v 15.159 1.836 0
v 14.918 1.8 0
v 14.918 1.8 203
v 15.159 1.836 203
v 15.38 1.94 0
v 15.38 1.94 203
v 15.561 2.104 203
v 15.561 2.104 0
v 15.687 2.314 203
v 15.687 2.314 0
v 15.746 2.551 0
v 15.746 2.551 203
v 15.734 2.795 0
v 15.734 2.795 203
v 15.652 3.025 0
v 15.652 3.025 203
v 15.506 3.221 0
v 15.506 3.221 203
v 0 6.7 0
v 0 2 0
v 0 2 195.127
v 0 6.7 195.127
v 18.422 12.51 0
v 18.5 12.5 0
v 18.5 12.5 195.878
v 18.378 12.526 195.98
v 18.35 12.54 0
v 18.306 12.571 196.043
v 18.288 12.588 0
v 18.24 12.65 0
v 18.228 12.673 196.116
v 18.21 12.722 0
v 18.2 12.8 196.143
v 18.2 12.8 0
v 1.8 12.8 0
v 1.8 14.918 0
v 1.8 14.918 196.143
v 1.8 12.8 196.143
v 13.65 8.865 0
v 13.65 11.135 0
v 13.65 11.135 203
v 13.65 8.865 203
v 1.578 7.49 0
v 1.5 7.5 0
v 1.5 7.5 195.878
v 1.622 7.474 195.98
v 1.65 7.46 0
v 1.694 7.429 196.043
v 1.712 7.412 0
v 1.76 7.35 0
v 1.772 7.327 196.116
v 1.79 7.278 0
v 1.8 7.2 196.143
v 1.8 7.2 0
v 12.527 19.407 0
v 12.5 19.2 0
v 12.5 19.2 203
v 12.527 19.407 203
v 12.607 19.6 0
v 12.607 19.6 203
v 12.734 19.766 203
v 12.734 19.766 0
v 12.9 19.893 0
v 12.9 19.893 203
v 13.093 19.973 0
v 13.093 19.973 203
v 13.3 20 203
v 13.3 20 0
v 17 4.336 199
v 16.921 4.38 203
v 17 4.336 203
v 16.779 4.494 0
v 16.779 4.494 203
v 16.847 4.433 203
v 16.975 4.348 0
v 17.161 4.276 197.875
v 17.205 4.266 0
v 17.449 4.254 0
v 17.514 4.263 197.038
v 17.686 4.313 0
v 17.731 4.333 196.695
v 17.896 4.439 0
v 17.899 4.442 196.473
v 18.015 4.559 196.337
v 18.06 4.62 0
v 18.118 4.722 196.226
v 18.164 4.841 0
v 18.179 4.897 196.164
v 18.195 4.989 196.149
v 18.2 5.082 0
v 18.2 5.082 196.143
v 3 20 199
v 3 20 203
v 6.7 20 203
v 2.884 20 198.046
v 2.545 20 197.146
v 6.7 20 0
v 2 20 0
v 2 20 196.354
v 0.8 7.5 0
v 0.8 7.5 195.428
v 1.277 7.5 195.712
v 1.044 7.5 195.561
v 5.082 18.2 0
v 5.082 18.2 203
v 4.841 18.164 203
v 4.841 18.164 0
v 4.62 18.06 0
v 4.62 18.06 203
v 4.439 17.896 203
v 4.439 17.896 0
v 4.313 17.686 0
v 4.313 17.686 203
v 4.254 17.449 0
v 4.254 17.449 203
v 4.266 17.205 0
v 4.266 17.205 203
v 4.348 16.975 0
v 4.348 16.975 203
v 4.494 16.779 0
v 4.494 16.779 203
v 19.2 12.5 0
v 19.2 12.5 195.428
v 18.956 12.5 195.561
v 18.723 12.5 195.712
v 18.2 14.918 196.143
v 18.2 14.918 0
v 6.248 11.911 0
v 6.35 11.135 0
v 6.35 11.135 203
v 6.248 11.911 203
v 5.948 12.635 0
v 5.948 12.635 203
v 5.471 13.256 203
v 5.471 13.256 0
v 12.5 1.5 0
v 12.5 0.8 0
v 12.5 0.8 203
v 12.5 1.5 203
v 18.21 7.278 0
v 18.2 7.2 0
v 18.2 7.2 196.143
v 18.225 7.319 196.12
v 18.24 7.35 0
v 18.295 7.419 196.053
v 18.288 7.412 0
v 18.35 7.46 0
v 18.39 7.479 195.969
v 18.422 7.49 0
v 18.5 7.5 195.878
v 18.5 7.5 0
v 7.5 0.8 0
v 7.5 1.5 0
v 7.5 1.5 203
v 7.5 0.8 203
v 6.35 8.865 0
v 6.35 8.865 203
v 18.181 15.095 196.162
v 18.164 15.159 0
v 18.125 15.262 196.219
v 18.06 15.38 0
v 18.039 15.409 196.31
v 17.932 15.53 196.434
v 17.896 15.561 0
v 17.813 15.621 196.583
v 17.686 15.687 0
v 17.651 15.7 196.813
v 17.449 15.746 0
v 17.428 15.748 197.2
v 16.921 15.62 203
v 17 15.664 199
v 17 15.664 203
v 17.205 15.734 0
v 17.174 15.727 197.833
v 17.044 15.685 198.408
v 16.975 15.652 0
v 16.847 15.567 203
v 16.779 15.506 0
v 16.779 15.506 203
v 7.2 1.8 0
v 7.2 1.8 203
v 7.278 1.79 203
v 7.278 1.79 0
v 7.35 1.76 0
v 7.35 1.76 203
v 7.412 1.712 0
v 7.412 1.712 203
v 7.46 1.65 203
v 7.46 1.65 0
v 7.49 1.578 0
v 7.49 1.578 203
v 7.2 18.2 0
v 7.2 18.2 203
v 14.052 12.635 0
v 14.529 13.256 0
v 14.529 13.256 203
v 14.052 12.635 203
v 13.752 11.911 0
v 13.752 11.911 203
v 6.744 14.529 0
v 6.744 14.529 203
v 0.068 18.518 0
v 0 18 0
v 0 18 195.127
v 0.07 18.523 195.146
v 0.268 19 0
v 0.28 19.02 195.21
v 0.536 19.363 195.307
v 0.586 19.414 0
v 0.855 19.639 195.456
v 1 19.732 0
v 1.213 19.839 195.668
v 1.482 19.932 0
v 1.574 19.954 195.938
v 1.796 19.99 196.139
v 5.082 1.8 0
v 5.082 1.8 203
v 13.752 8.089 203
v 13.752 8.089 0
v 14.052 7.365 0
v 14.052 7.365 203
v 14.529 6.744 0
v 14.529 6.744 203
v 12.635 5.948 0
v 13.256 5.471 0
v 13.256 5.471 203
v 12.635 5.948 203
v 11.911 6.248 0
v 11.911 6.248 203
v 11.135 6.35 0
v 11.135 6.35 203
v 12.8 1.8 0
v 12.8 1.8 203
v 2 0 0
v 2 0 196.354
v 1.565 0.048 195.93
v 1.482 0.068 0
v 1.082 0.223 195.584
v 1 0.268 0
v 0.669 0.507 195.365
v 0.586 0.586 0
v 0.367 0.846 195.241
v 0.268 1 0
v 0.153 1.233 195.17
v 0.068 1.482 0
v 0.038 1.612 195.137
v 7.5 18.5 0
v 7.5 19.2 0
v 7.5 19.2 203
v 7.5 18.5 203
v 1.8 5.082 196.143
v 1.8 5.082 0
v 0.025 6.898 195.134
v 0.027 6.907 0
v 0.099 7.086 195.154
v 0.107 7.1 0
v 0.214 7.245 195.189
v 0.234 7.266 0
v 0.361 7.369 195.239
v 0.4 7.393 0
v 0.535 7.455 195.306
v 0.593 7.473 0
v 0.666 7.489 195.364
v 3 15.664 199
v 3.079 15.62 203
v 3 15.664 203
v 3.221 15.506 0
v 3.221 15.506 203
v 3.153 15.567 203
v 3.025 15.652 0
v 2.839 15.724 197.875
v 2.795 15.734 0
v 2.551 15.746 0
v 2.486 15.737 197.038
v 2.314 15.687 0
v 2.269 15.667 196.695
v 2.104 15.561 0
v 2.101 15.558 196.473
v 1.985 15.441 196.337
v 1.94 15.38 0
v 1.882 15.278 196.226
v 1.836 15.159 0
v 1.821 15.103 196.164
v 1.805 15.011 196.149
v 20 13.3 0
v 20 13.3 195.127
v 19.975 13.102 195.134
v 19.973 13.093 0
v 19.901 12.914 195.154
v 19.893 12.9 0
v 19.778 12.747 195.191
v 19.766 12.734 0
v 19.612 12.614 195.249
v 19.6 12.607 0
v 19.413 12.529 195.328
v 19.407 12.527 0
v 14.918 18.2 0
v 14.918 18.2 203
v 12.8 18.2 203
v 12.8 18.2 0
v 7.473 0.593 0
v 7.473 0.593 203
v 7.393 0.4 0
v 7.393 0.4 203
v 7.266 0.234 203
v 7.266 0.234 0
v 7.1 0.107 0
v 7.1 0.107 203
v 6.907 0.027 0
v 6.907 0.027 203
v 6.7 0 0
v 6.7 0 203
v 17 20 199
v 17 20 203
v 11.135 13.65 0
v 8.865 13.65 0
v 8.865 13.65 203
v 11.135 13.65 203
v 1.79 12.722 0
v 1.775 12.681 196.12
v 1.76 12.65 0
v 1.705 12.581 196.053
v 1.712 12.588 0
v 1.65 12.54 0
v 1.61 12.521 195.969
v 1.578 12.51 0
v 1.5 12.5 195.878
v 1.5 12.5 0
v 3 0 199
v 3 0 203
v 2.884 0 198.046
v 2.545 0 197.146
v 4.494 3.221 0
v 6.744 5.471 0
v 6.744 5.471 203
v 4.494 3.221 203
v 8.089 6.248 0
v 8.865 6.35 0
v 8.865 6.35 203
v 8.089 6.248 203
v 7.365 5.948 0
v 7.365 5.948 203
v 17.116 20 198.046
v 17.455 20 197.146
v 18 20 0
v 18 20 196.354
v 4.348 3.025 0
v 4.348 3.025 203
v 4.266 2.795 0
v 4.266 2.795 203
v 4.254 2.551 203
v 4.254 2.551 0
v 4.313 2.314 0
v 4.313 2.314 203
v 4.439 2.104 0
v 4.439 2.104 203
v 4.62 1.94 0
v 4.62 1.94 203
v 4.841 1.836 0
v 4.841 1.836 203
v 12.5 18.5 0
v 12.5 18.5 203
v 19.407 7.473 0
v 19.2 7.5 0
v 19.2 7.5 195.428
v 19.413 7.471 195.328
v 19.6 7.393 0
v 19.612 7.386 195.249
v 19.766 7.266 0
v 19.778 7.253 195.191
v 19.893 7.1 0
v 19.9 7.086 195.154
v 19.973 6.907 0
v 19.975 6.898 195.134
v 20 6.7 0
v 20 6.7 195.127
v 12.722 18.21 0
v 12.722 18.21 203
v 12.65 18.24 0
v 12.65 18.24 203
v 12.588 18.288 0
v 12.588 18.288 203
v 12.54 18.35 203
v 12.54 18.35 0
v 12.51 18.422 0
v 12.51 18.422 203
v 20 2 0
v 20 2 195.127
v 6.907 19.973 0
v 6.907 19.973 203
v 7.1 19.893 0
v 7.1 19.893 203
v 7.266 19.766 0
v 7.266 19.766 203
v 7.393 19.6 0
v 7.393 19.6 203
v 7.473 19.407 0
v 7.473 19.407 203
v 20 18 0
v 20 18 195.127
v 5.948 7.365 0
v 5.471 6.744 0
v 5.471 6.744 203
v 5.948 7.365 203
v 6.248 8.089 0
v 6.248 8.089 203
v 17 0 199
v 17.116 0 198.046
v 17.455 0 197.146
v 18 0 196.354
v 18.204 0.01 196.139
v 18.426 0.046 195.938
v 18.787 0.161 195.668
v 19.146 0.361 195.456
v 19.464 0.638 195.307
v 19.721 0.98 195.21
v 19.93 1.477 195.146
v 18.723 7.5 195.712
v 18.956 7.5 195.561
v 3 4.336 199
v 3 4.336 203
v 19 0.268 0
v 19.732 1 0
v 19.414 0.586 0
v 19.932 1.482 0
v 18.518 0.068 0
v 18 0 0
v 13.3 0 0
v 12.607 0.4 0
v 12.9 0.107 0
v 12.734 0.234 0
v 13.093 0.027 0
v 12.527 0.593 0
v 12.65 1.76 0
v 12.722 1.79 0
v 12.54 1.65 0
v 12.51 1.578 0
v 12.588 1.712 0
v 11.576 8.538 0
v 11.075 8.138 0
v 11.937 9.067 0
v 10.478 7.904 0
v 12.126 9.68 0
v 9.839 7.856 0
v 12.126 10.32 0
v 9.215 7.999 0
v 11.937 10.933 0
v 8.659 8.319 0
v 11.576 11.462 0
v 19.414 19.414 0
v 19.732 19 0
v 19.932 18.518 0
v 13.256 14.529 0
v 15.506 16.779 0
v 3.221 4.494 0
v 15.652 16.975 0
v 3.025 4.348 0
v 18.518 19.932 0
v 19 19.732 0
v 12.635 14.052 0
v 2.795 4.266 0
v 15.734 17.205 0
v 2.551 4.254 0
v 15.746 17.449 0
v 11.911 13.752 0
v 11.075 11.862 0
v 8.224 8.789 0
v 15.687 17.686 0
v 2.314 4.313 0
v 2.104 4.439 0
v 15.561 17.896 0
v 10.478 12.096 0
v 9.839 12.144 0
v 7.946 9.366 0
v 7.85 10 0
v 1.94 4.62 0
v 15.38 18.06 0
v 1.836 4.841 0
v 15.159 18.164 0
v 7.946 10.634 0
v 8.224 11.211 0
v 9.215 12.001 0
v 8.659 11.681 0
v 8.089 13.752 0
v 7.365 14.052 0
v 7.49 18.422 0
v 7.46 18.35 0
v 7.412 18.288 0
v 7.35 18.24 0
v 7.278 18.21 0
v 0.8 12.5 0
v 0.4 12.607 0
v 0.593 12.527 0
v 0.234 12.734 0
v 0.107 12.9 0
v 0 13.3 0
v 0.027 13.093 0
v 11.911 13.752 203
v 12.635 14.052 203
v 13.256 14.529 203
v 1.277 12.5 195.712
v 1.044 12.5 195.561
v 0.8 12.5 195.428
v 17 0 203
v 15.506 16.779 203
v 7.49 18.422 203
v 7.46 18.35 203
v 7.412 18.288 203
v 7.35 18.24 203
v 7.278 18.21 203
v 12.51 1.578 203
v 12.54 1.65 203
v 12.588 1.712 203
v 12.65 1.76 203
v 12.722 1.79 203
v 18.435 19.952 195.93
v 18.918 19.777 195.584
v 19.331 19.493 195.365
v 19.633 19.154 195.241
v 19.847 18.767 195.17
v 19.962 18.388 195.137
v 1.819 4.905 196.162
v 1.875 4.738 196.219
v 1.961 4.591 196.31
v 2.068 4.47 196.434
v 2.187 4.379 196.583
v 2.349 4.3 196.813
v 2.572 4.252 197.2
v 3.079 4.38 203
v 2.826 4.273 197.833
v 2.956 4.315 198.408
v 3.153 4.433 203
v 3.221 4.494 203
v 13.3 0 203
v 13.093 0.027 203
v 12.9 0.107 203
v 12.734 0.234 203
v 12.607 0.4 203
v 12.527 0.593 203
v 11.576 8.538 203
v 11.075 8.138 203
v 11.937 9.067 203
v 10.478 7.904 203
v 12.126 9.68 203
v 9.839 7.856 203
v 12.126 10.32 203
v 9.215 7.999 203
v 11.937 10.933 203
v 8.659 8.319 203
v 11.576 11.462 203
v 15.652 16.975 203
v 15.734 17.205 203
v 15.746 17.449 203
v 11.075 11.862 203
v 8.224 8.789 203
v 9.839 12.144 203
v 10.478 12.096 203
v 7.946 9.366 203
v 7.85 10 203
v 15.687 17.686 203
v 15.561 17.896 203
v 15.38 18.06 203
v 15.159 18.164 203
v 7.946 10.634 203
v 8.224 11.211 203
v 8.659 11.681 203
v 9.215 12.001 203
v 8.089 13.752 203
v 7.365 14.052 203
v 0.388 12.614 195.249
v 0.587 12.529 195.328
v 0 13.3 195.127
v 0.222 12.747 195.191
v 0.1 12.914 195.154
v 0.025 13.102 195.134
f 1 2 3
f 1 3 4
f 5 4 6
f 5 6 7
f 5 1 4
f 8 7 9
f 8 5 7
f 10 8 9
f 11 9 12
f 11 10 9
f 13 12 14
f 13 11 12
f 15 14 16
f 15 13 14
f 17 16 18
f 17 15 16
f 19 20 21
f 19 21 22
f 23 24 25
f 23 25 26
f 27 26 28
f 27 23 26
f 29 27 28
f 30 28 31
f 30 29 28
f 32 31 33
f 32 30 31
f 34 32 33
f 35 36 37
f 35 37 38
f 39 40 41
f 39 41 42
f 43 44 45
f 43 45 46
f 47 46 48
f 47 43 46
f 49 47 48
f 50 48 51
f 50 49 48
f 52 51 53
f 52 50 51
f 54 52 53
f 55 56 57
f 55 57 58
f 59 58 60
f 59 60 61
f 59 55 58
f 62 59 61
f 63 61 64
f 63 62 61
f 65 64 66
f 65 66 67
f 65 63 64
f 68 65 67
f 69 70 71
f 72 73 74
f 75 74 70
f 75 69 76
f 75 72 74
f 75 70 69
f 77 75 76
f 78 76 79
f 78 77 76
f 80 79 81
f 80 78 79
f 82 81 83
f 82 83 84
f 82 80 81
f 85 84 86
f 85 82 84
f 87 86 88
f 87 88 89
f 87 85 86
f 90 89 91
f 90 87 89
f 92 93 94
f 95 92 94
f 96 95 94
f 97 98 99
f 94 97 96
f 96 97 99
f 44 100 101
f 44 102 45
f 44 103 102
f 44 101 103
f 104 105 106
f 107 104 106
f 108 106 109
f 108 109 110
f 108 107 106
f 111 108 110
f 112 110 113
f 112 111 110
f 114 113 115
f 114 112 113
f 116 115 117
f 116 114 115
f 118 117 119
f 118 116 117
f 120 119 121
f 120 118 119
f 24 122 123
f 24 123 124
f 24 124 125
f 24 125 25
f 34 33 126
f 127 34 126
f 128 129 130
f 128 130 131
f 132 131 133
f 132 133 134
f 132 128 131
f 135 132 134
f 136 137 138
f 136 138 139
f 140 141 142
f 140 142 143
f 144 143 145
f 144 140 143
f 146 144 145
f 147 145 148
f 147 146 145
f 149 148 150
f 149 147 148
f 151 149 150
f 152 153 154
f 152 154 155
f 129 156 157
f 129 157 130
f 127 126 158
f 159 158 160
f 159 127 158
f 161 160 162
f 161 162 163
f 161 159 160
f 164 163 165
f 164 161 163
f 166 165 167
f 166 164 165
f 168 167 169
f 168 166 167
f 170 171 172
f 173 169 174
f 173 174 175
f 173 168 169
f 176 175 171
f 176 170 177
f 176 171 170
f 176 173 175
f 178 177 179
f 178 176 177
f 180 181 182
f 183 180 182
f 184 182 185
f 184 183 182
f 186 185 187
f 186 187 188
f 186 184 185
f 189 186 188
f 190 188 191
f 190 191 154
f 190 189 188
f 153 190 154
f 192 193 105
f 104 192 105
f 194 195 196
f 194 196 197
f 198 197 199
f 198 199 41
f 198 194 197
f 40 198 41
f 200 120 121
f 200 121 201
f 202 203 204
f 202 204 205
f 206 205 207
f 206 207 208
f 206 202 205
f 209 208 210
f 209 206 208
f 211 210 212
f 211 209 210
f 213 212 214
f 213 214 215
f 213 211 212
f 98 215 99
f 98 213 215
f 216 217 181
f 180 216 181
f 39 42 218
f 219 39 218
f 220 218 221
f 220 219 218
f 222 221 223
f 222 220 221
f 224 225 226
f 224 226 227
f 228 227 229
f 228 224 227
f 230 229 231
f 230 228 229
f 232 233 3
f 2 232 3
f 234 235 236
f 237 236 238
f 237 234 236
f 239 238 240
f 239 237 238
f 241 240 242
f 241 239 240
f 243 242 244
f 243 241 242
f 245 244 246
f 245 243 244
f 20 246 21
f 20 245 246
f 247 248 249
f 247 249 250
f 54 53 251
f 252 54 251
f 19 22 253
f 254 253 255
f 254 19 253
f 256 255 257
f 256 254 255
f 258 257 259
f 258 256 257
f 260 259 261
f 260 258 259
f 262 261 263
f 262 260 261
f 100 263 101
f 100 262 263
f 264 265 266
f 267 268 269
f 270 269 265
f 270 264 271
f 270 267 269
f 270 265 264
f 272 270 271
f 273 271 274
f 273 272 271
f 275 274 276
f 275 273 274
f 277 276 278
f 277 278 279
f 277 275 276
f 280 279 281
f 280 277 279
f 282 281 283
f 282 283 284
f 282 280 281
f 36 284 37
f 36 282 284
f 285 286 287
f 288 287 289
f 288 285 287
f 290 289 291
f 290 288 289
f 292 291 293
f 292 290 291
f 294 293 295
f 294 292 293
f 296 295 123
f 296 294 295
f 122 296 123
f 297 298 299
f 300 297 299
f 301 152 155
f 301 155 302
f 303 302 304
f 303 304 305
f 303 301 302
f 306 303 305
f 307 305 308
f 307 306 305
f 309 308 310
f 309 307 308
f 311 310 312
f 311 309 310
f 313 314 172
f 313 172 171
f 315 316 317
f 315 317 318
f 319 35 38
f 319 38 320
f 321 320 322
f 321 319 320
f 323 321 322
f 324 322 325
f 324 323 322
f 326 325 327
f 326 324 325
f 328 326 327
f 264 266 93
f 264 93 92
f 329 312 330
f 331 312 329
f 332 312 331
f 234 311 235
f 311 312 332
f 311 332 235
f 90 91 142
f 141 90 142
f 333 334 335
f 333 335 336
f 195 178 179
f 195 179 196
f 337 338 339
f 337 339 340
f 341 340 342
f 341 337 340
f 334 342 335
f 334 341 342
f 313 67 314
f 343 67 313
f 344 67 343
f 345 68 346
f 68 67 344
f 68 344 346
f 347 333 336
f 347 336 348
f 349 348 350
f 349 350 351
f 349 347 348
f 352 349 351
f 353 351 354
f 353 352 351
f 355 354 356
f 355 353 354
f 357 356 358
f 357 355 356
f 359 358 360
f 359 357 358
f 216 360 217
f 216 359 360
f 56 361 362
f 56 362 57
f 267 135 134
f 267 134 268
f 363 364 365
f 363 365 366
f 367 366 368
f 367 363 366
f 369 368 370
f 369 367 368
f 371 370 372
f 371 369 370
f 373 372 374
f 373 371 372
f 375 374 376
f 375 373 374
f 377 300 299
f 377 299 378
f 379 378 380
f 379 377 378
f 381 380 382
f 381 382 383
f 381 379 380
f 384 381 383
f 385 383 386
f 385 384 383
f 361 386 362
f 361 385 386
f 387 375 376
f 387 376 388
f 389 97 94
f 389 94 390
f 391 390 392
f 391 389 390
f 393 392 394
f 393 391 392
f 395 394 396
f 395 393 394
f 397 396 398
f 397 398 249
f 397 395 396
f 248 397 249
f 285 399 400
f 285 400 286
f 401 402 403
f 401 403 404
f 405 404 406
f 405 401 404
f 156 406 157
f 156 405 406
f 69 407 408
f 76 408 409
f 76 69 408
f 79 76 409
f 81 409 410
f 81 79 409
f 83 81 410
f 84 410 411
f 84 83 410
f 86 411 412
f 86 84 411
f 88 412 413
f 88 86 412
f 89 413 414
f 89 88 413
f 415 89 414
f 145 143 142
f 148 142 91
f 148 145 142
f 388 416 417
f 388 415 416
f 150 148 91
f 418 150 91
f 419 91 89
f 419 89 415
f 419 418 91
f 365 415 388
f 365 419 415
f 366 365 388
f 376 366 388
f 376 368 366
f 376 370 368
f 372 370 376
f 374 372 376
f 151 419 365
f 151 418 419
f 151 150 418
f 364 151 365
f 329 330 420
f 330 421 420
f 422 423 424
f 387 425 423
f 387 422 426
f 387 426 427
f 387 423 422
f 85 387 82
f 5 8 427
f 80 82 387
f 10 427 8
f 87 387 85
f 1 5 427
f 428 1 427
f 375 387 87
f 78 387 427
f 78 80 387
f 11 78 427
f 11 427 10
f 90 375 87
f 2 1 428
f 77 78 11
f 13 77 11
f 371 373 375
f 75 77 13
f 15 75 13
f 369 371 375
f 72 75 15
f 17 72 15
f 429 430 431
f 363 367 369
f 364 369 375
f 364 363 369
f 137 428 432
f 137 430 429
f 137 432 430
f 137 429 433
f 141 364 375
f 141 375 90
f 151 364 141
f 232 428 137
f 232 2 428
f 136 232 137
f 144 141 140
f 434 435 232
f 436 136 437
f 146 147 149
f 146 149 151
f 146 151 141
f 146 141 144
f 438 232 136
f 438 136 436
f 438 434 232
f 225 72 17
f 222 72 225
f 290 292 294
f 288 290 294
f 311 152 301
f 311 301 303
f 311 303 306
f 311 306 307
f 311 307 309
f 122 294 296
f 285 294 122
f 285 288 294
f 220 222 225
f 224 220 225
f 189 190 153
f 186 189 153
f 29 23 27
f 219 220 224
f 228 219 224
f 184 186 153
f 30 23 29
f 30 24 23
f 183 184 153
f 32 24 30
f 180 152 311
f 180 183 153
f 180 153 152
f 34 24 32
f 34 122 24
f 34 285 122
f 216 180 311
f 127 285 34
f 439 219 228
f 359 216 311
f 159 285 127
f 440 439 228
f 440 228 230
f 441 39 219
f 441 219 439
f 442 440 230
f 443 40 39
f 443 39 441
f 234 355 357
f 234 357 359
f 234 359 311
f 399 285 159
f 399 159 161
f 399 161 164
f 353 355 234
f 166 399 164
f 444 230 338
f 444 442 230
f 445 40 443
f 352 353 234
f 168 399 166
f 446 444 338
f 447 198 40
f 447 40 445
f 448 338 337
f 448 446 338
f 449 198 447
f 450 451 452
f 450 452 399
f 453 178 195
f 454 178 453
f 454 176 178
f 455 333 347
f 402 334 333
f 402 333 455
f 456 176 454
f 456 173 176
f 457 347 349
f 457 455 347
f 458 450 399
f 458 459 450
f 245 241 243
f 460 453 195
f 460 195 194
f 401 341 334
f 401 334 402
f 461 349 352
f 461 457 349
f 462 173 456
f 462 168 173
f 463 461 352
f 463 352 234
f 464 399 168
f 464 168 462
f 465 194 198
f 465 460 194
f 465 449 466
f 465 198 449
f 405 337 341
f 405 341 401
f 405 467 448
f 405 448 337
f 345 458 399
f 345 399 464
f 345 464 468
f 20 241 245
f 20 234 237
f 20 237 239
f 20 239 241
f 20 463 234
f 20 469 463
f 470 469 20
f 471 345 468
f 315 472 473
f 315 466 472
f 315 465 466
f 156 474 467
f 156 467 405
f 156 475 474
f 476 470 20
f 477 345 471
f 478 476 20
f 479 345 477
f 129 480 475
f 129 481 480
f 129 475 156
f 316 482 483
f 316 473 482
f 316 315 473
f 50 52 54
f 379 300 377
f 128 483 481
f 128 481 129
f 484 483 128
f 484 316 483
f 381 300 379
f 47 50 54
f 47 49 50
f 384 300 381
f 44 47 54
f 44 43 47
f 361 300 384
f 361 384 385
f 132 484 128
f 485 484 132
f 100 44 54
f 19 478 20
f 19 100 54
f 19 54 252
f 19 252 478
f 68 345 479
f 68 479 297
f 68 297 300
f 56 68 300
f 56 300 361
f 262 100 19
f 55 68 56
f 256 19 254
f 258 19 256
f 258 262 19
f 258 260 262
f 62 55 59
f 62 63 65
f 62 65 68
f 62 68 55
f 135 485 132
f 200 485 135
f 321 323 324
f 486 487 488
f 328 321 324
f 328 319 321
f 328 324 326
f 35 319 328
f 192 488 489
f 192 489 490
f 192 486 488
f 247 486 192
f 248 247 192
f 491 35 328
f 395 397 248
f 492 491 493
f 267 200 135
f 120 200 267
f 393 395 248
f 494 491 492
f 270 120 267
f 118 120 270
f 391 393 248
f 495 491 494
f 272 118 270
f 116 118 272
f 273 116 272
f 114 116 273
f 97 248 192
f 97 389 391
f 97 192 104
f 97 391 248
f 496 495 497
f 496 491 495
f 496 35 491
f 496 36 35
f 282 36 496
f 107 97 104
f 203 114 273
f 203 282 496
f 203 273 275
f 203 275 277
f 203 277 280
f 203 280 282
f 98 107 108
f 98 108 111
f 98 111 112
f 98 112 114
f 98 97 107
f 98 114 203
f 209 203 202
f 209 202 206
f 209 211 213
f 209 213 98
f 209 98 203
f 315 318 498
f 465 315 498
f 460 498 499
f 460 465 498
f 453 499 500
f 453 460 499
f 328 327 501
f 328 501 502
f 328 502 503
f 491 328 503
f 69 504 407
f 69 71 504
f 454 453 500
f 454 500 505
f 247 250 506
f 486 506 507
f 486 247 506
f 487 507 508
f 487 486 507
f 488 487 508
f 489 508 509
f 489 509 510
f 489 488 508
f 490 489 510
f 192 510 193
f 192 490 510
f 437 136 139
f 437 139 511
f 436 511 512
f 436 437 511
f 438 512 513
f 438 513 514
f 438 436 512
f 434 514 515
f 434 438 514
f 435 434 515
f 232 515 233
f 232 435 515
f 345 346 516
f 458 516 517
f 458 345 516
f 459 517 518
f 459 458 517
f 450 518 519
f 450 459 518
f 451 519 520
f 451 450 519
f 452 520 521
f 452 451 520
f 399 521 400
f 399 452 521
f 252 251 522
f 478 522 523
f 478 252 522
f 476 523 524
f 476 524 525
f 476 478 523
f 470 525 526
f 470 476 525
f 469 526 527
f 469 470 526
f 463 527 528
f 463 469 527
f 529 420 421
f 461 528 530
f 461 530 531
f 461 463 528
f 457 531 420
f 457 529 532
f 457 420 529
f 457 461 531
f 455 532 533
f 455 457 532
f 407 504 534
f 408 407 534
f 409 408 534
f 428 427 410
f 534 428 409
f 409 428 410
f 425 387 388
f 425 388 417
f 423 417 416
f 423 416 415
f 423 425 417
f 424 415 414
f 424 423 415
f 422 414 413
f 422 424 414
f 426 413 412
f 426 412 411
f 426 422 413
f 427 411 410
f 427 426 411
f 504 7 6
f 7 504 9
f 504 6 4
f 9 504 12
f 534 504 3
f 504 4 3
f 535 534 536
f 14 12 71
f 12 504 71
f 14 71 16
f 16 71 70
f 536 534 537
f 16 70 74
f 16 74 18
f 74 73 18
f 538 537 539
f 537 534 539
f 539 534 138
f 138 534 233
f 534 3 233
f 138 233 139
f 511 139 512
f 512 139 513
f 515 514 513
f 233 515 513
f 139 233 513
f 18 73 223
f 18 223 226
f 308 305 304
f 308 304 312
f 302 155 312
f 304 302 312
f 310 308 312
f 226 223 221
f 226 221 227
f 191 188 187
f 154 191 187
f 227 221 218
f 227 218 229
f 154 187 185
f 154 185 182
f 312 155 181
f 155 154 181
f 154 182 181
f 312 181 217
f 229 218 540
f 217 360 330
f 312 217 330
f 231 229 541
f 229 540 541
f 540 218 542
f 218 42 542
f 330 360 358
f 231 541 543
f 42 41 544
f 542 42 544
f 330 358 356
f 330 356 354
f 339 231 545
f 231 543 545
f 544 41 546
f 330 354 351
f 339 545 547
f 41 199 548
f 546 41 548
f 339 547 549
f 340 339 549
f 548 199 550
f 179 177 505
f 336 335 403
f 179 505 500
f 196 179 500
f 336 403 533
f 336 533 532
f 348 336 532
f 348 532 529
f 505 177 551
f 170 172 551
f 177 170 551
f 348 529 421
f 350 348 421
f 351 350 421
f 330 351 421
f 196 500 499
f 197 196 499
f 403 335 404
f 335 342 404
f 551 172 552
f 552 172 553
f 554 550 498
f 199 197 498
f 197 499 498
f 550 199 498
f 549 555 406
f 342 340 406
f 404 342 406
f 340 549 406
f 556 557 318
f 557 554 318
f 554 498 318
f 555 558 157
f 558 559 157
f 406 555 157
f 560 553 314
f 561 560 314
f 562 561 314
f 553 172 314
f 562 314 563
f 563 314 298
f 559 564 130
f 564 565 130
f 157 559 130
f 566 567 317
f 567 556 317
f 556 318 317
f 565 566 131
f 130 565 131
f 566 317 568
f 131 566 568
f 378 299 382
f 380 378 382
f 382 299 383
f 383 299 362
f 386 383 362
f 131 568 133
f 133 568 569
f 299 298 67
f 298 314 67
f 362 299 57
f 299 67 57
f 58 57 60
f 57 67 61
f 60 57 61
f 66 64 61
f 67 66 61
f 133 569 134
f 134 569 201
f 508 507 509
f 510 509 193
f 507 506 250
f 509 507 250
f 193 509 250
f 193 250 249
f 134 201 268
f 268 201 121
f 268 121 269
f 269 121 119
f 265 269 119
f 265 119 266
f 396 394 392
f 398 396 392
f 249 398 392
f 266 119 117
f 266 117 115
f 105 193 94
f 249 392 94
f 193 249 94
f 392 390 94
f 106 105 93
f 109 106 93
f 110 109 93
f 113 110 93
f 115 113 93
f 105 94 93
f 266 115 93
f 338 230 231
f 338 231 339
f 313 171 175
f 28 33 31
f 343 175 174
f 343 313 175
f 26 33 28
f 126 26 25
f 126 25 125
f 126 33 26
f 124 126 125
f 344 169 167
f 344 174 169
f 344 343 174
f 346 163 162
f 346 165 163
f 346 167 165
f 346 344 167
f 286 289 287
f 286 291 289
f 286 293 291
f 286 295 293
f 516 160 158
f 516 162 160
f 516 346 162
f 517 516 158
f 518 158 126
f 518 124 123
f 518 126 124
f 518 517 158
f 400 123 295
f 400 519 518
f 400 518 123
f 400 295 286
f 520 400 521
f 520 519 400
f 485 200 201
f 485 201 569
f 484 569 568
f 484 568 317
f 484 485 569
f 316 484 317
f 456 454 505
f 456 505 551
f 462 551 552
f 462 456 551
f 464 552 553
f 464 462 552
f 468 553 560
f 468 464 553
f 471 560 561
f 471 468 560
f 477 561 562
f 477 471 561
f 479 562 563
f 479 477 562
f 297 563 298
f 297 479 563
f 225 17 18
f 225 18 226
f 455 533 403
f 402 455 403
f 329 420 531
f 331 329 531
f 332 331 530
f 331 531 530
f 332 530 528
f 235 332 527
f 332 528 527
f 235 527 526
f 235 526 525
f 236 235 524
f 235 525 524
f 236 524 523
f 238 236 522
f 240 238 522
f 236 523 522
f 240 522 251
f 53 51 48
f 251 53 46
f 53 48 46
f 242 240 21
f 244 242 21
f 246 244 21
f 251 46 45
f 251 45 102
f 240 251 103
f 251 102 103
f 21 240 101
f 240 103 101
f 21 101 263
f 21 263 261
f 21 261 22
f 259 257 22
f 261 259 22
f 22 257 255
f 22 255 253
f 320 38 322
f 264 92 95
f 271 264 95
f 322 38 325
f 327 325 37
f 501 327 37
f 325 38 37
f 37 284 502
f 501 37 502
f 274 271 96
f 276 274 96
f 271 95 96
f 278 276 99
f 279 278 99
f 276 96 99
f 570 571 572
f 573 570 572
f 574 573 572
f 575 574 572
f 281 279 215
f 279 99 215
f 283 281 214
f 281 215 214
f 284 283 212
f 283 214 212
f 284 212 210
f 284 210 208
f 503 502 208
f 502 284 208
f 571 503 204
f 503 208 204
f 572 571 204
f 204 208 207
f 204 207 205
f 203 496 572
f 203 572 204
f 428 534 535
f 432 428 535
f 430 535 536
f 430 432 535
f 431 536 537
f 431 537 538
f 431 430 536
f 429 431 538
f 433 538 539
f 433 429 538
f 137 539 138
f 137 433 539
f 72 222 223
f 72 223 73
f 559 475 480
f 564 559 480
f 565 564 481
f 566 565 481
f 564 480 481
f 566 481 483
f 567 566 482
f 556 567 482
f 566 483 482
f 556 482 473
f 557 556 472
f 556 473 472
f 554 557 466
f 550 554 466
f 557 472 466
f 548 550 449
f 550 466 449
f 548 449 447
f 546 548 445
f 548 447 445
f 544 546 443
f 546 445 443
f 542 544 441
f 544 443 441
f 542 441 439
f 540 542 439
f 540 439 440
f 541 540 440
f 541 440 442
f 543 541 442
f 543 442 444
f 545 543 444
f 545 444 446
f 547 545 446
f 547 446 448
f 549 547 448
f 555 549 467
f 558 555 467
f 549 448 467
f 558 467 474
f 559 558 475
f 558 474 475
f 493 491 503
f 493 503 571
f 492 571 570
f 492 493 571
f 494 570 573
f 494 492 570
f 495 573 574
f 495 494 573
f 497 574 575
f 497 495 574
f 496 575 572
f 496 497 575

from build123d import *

# Parameters (mm, degrees)
ESQUISSE1_R             = 2.15
BOSS_EXTRU_1_DEPTH      = 203
ENL_V_MAT_EXTRU_1_DEPTH = 205.960971895


with BuildPart() as part:
    # Esquisse1 → Boss.-Extru.1 (new body)
    with BuildSketch(Plane(origin=(0, 0, 0), x_dir=(-1, 0, 0), z_dir=(0, 0, -1))):
        with BuildLine():
            Line((-12.499999997, 0.800000003), (-12.499999998, 1.500000003))
            ThreePointArc((-12.499999998, 1.500000003), (-12.587867964, 1.712132039), (-12.8, 1.800000005))
            Line((-12.8, 1.800000005), (-14.9175884, 1.800000005))
            ThreePointArc((-14.9175884, 1.800000005), (-15.686636444, 2.31386148), (-15.50619229, 3.2210155))
            Line((-15.50619229, 3.2210155), (-13.25588745, 5.47132034))
            ThreePointArc((-13.25588745, 5.47132034), (-12.282617404, 6.121638593), (-11.134567108, 6.349999996))
            Line((-11.134567108, 6.349999996), (-8.865432907, 6.349999996))
            ThreePointArc((-8.865432907, 6.349999996), (-7.717382611, 6.121638594), (-6.744112567, 5.471320341))
            Line((-6.744112567, 5.471320341), (-4.493807729, 3.221015503))
            ThreePointArc((-4.493807729, 3.221015503), (-4.313363575, 2.313861481), (-5.082411621, 1.800000005))
            Line((-5.082411621, 1.800000005), (-7.20000001, 1.800000005))
            ThreePointArc((-7.20000001, 1.800000005), (-7.412132045, 1.71213204), (-7.50000001, 1.500000005))
            Line((-7.50000001, 1.500000005), (-7.50000001, 0.8))
            ThreePointArc((-7.50000001, 0.8), (-7.265685435, 0.234314575), (-6.70000001, 0))
            Line((-6.70000001, 0), (-2, 0))
            ThreePointArc((-2, 0), (-0.585786438, 0.585786438), (0, 2))
            Line((0, 2), (0, 6.699999998))
            ThreePointArc((0, 6.699999998), (-0.234314576, 7.265685424), (-0.800000003, 7.5))
            Line((-0.800000003, 7.5), (-1.50000001, 7.5))
            ThreePointArc((-1.50000001, 7.5), (-1.712132046, 7.412132033), (-1.800000013, 7.199999997))
            Line((-1.800000013, 7.199999997), (-1.800000013, 5.082411603))
            ThreePointArc((-1.800000013, 5.082411603), (-2.313861487, 4.31336356), (-3.221015507, 4.493807713))
            Line((-3.221015507, 4.493807713), (-5.471320347, 6.744112553))
            ThreePointArc((-5.471320347, 6.744112553), (-6.1216386, 7.717382599), (-6.350000003, 8.865432896))
            Line((-6.350000003, 8.865432896), (-6.350000003, 11.134567102))
            ThreePointArc((-6.350000003, 11.134567102), (-6.121638601, 12.282617397), (-5.471320348, 13.255887442))
            Line((-5.471320348, 13.255887442), (-3.221015512, 15.506192278))
            ThreePointArc((-3.221015512, 15.506192278), (-2.313861489, 15.686636432), (-1.800000013, 14.917588386))
            Line((-1.800000013, 14.917588386), (-1.800000013, 12.799999998))
            ThreePointArc((-1.800000013, 12.799999998), (-1.712132047, 12.587867963), (-1.500000013, 12.499999997))
            Line((-1.500000013, 12.499999997), (-0.8, 12.499999997))
            ThreePointArc((-0.8, 12.499999997), (-0.234314575, 12.734314573), (0, 13.299999998))
            Line((0, 13.299999998), (0, 18))
            ThreePointArc((0, 18), (-0.585786438, 19.414213562), (-2, 20))
            Line((-2, 20), (-6.700000008, 20))
            ThreePointArc((-6.700000008, 20), (-7.265685435, 19.765685424), (-7.50000001, 19.199999998))
            Line((-7.50000001, 19.199999998), (-7.50000001, 18.500000005))
            ThreePointArc((-7.50000001, 18.500000005), (-7.412132044, 18.287867969), (-7.200000008, 18.200000003))
            Line((-7.200000008, 18.200000003), (-5.082411594, 18.200000003))
            ThreePointArc((-5.082411594, 18.200000003), (-4.313363546, 17.686138526), (-4.493807701, 16.778984501))
            Line((-4.493807701, 16.778984501), (-6.744112542, 14.528679659))
            ThreePointArc((-6.744112542, 14.528679659), (-7.717382588, 13.878361406), (-8.865432885, 13.650000003))
            Line((-8.865432885, 13.650000003), (-11.134567112, 13.650000003))
            ThreePointArc((-11.134567112, 13.650000003), (-12.282617407, 13.878361405), (-13.255887452, 14.528679658))
            Line((-13.255887452, 14.528679658), (-15.506192292, 16.778984498))
            ThreePointArc((-15.506192292, 16.778984498), (-15.686636447, 17.686138525), (-14.917588397, 18.200000002))
            Line((-14.917588397, 18.200000002), (-12.799999998, 18.200000003))
            ThreePointArc((-12.799999998, 18.200000003), (-12.587867963, 18.287867968), (-12.499999997, 18.500000002))
            Line((-12.499999997, 18.500000002), (-12.499999997, 19.2))
            ThreePointArc((-12.499999997, 19.2), (-12.734314573, 19.765685425), (-13.299999998, 20))
            Line((-13.299999998, 20), (-18, 20))
            ThreePointArc((-18, 20), (-19.414213562, 19.414213562), (-20, 18))
            Line((-20, 18), (-20, 13.3))
            ThreePointArc((-20, 13.3), (-19.765685424, 12.734314573), (-19.199999998, 12.499999997))
            Line((-19.199999998, 12.499999997), (-18.500000003, 12.499999997))
            ThreePointArc((-18.500000003, 12.499999997), (-18.287867967, 12.587867964), (-18.2, 12.8))
            Line((-18.2, 12.8), (-18.2, 14.91758839))
            ThreePointArc((-18.2, 14.91758839), (-17.686138526, 15.686636434), (-16.778984506, 15.50619228))
            Line((-16.778984506, 15.50619228), (-14.528679657, 13.255887431))
            ThreePointArc((-14.528679657, 13.255887431), (-13.878361403, 12.282617385), (-13.650000001, 11.134567088))
            Line((-13.650000001, 11.134567088), (-13.650000001, 8.865432886))
            ThreePointArc((-13.650000001, 8.865432886), (-13.878361403, 7.717382591), (-14.528679656, 6.744112546))
            Line((-14.528679656, 6.744112546), (-16.778984496, 4.493807706))
            ThreePointArc((-16.778984496, 4.493807706), (-17.686138522, 4.313363551), (-18.2, 5.0824116))
            Line((-18.2, 5.0824116), (-18.2, 7.2))
            ThreePointArc((-18.2, 7.2), (-18.287867966, 7.412132034), (-18.5, 7.5))
            Line((-18.5, 7.5), (-19.2, 7.5))
            ThreePointArc((-19.2, 7.5), (-19.765685425, 7.265685425), (-20, 6.7))
            Line((-20, 6.7), (-20, 2))
            ThreePointArc((-20, 2), (-19.414213562, 0.585786438), (-18, 0))
            Line((-18, 0), (-13.3, 0))
            ThreePointArc((-13.3, 0), (-12.734314573, 0.234314576), (-12.499999997, 0.800000003))
        make_face()
        with Locations((-10, 10)):
            Circle(ESQUISSE1_R, mode=Mode.SUBTRACT)
    extrude(amount=-BOSS_EXTRU_1_DEPTH)

    # Esquisse2 → Enlèv. mat.-Extru.1 (cut, through all)
    with BuildSketch(Plane(origin=(0, 20, 0), x_dir=(1, 0, 0), z_dir=(0, 1, 0))):
        with BuildLine():
            Line((25, -199), (25, -209))
            ThreePointArc((25, -209), (21, -213), (17, -209))
            Line((17, -209), (17, -199))
            ThreePointArc((17, -199), (21, -195), (25, -199))
        make_face()
        with BuildLine():
            Line((-5.000000003, -199), (-5.000000003, -209))
            ThreePointArc((-5.000000003, -209), (-1.000000003, -213), (2.999999997, -209))
            Line((2.999999997, -209), (2.999999997, -199))
            ThreePointArc((2.999999997, -199), (-1.000000003, -195), (-5.000000003, -199))
        make_face()
    extrude(amount=-ENL_V_MAT_EXTRU_1_DEPTH, mode=Mode.SUBTRACT)


solid = part.part
